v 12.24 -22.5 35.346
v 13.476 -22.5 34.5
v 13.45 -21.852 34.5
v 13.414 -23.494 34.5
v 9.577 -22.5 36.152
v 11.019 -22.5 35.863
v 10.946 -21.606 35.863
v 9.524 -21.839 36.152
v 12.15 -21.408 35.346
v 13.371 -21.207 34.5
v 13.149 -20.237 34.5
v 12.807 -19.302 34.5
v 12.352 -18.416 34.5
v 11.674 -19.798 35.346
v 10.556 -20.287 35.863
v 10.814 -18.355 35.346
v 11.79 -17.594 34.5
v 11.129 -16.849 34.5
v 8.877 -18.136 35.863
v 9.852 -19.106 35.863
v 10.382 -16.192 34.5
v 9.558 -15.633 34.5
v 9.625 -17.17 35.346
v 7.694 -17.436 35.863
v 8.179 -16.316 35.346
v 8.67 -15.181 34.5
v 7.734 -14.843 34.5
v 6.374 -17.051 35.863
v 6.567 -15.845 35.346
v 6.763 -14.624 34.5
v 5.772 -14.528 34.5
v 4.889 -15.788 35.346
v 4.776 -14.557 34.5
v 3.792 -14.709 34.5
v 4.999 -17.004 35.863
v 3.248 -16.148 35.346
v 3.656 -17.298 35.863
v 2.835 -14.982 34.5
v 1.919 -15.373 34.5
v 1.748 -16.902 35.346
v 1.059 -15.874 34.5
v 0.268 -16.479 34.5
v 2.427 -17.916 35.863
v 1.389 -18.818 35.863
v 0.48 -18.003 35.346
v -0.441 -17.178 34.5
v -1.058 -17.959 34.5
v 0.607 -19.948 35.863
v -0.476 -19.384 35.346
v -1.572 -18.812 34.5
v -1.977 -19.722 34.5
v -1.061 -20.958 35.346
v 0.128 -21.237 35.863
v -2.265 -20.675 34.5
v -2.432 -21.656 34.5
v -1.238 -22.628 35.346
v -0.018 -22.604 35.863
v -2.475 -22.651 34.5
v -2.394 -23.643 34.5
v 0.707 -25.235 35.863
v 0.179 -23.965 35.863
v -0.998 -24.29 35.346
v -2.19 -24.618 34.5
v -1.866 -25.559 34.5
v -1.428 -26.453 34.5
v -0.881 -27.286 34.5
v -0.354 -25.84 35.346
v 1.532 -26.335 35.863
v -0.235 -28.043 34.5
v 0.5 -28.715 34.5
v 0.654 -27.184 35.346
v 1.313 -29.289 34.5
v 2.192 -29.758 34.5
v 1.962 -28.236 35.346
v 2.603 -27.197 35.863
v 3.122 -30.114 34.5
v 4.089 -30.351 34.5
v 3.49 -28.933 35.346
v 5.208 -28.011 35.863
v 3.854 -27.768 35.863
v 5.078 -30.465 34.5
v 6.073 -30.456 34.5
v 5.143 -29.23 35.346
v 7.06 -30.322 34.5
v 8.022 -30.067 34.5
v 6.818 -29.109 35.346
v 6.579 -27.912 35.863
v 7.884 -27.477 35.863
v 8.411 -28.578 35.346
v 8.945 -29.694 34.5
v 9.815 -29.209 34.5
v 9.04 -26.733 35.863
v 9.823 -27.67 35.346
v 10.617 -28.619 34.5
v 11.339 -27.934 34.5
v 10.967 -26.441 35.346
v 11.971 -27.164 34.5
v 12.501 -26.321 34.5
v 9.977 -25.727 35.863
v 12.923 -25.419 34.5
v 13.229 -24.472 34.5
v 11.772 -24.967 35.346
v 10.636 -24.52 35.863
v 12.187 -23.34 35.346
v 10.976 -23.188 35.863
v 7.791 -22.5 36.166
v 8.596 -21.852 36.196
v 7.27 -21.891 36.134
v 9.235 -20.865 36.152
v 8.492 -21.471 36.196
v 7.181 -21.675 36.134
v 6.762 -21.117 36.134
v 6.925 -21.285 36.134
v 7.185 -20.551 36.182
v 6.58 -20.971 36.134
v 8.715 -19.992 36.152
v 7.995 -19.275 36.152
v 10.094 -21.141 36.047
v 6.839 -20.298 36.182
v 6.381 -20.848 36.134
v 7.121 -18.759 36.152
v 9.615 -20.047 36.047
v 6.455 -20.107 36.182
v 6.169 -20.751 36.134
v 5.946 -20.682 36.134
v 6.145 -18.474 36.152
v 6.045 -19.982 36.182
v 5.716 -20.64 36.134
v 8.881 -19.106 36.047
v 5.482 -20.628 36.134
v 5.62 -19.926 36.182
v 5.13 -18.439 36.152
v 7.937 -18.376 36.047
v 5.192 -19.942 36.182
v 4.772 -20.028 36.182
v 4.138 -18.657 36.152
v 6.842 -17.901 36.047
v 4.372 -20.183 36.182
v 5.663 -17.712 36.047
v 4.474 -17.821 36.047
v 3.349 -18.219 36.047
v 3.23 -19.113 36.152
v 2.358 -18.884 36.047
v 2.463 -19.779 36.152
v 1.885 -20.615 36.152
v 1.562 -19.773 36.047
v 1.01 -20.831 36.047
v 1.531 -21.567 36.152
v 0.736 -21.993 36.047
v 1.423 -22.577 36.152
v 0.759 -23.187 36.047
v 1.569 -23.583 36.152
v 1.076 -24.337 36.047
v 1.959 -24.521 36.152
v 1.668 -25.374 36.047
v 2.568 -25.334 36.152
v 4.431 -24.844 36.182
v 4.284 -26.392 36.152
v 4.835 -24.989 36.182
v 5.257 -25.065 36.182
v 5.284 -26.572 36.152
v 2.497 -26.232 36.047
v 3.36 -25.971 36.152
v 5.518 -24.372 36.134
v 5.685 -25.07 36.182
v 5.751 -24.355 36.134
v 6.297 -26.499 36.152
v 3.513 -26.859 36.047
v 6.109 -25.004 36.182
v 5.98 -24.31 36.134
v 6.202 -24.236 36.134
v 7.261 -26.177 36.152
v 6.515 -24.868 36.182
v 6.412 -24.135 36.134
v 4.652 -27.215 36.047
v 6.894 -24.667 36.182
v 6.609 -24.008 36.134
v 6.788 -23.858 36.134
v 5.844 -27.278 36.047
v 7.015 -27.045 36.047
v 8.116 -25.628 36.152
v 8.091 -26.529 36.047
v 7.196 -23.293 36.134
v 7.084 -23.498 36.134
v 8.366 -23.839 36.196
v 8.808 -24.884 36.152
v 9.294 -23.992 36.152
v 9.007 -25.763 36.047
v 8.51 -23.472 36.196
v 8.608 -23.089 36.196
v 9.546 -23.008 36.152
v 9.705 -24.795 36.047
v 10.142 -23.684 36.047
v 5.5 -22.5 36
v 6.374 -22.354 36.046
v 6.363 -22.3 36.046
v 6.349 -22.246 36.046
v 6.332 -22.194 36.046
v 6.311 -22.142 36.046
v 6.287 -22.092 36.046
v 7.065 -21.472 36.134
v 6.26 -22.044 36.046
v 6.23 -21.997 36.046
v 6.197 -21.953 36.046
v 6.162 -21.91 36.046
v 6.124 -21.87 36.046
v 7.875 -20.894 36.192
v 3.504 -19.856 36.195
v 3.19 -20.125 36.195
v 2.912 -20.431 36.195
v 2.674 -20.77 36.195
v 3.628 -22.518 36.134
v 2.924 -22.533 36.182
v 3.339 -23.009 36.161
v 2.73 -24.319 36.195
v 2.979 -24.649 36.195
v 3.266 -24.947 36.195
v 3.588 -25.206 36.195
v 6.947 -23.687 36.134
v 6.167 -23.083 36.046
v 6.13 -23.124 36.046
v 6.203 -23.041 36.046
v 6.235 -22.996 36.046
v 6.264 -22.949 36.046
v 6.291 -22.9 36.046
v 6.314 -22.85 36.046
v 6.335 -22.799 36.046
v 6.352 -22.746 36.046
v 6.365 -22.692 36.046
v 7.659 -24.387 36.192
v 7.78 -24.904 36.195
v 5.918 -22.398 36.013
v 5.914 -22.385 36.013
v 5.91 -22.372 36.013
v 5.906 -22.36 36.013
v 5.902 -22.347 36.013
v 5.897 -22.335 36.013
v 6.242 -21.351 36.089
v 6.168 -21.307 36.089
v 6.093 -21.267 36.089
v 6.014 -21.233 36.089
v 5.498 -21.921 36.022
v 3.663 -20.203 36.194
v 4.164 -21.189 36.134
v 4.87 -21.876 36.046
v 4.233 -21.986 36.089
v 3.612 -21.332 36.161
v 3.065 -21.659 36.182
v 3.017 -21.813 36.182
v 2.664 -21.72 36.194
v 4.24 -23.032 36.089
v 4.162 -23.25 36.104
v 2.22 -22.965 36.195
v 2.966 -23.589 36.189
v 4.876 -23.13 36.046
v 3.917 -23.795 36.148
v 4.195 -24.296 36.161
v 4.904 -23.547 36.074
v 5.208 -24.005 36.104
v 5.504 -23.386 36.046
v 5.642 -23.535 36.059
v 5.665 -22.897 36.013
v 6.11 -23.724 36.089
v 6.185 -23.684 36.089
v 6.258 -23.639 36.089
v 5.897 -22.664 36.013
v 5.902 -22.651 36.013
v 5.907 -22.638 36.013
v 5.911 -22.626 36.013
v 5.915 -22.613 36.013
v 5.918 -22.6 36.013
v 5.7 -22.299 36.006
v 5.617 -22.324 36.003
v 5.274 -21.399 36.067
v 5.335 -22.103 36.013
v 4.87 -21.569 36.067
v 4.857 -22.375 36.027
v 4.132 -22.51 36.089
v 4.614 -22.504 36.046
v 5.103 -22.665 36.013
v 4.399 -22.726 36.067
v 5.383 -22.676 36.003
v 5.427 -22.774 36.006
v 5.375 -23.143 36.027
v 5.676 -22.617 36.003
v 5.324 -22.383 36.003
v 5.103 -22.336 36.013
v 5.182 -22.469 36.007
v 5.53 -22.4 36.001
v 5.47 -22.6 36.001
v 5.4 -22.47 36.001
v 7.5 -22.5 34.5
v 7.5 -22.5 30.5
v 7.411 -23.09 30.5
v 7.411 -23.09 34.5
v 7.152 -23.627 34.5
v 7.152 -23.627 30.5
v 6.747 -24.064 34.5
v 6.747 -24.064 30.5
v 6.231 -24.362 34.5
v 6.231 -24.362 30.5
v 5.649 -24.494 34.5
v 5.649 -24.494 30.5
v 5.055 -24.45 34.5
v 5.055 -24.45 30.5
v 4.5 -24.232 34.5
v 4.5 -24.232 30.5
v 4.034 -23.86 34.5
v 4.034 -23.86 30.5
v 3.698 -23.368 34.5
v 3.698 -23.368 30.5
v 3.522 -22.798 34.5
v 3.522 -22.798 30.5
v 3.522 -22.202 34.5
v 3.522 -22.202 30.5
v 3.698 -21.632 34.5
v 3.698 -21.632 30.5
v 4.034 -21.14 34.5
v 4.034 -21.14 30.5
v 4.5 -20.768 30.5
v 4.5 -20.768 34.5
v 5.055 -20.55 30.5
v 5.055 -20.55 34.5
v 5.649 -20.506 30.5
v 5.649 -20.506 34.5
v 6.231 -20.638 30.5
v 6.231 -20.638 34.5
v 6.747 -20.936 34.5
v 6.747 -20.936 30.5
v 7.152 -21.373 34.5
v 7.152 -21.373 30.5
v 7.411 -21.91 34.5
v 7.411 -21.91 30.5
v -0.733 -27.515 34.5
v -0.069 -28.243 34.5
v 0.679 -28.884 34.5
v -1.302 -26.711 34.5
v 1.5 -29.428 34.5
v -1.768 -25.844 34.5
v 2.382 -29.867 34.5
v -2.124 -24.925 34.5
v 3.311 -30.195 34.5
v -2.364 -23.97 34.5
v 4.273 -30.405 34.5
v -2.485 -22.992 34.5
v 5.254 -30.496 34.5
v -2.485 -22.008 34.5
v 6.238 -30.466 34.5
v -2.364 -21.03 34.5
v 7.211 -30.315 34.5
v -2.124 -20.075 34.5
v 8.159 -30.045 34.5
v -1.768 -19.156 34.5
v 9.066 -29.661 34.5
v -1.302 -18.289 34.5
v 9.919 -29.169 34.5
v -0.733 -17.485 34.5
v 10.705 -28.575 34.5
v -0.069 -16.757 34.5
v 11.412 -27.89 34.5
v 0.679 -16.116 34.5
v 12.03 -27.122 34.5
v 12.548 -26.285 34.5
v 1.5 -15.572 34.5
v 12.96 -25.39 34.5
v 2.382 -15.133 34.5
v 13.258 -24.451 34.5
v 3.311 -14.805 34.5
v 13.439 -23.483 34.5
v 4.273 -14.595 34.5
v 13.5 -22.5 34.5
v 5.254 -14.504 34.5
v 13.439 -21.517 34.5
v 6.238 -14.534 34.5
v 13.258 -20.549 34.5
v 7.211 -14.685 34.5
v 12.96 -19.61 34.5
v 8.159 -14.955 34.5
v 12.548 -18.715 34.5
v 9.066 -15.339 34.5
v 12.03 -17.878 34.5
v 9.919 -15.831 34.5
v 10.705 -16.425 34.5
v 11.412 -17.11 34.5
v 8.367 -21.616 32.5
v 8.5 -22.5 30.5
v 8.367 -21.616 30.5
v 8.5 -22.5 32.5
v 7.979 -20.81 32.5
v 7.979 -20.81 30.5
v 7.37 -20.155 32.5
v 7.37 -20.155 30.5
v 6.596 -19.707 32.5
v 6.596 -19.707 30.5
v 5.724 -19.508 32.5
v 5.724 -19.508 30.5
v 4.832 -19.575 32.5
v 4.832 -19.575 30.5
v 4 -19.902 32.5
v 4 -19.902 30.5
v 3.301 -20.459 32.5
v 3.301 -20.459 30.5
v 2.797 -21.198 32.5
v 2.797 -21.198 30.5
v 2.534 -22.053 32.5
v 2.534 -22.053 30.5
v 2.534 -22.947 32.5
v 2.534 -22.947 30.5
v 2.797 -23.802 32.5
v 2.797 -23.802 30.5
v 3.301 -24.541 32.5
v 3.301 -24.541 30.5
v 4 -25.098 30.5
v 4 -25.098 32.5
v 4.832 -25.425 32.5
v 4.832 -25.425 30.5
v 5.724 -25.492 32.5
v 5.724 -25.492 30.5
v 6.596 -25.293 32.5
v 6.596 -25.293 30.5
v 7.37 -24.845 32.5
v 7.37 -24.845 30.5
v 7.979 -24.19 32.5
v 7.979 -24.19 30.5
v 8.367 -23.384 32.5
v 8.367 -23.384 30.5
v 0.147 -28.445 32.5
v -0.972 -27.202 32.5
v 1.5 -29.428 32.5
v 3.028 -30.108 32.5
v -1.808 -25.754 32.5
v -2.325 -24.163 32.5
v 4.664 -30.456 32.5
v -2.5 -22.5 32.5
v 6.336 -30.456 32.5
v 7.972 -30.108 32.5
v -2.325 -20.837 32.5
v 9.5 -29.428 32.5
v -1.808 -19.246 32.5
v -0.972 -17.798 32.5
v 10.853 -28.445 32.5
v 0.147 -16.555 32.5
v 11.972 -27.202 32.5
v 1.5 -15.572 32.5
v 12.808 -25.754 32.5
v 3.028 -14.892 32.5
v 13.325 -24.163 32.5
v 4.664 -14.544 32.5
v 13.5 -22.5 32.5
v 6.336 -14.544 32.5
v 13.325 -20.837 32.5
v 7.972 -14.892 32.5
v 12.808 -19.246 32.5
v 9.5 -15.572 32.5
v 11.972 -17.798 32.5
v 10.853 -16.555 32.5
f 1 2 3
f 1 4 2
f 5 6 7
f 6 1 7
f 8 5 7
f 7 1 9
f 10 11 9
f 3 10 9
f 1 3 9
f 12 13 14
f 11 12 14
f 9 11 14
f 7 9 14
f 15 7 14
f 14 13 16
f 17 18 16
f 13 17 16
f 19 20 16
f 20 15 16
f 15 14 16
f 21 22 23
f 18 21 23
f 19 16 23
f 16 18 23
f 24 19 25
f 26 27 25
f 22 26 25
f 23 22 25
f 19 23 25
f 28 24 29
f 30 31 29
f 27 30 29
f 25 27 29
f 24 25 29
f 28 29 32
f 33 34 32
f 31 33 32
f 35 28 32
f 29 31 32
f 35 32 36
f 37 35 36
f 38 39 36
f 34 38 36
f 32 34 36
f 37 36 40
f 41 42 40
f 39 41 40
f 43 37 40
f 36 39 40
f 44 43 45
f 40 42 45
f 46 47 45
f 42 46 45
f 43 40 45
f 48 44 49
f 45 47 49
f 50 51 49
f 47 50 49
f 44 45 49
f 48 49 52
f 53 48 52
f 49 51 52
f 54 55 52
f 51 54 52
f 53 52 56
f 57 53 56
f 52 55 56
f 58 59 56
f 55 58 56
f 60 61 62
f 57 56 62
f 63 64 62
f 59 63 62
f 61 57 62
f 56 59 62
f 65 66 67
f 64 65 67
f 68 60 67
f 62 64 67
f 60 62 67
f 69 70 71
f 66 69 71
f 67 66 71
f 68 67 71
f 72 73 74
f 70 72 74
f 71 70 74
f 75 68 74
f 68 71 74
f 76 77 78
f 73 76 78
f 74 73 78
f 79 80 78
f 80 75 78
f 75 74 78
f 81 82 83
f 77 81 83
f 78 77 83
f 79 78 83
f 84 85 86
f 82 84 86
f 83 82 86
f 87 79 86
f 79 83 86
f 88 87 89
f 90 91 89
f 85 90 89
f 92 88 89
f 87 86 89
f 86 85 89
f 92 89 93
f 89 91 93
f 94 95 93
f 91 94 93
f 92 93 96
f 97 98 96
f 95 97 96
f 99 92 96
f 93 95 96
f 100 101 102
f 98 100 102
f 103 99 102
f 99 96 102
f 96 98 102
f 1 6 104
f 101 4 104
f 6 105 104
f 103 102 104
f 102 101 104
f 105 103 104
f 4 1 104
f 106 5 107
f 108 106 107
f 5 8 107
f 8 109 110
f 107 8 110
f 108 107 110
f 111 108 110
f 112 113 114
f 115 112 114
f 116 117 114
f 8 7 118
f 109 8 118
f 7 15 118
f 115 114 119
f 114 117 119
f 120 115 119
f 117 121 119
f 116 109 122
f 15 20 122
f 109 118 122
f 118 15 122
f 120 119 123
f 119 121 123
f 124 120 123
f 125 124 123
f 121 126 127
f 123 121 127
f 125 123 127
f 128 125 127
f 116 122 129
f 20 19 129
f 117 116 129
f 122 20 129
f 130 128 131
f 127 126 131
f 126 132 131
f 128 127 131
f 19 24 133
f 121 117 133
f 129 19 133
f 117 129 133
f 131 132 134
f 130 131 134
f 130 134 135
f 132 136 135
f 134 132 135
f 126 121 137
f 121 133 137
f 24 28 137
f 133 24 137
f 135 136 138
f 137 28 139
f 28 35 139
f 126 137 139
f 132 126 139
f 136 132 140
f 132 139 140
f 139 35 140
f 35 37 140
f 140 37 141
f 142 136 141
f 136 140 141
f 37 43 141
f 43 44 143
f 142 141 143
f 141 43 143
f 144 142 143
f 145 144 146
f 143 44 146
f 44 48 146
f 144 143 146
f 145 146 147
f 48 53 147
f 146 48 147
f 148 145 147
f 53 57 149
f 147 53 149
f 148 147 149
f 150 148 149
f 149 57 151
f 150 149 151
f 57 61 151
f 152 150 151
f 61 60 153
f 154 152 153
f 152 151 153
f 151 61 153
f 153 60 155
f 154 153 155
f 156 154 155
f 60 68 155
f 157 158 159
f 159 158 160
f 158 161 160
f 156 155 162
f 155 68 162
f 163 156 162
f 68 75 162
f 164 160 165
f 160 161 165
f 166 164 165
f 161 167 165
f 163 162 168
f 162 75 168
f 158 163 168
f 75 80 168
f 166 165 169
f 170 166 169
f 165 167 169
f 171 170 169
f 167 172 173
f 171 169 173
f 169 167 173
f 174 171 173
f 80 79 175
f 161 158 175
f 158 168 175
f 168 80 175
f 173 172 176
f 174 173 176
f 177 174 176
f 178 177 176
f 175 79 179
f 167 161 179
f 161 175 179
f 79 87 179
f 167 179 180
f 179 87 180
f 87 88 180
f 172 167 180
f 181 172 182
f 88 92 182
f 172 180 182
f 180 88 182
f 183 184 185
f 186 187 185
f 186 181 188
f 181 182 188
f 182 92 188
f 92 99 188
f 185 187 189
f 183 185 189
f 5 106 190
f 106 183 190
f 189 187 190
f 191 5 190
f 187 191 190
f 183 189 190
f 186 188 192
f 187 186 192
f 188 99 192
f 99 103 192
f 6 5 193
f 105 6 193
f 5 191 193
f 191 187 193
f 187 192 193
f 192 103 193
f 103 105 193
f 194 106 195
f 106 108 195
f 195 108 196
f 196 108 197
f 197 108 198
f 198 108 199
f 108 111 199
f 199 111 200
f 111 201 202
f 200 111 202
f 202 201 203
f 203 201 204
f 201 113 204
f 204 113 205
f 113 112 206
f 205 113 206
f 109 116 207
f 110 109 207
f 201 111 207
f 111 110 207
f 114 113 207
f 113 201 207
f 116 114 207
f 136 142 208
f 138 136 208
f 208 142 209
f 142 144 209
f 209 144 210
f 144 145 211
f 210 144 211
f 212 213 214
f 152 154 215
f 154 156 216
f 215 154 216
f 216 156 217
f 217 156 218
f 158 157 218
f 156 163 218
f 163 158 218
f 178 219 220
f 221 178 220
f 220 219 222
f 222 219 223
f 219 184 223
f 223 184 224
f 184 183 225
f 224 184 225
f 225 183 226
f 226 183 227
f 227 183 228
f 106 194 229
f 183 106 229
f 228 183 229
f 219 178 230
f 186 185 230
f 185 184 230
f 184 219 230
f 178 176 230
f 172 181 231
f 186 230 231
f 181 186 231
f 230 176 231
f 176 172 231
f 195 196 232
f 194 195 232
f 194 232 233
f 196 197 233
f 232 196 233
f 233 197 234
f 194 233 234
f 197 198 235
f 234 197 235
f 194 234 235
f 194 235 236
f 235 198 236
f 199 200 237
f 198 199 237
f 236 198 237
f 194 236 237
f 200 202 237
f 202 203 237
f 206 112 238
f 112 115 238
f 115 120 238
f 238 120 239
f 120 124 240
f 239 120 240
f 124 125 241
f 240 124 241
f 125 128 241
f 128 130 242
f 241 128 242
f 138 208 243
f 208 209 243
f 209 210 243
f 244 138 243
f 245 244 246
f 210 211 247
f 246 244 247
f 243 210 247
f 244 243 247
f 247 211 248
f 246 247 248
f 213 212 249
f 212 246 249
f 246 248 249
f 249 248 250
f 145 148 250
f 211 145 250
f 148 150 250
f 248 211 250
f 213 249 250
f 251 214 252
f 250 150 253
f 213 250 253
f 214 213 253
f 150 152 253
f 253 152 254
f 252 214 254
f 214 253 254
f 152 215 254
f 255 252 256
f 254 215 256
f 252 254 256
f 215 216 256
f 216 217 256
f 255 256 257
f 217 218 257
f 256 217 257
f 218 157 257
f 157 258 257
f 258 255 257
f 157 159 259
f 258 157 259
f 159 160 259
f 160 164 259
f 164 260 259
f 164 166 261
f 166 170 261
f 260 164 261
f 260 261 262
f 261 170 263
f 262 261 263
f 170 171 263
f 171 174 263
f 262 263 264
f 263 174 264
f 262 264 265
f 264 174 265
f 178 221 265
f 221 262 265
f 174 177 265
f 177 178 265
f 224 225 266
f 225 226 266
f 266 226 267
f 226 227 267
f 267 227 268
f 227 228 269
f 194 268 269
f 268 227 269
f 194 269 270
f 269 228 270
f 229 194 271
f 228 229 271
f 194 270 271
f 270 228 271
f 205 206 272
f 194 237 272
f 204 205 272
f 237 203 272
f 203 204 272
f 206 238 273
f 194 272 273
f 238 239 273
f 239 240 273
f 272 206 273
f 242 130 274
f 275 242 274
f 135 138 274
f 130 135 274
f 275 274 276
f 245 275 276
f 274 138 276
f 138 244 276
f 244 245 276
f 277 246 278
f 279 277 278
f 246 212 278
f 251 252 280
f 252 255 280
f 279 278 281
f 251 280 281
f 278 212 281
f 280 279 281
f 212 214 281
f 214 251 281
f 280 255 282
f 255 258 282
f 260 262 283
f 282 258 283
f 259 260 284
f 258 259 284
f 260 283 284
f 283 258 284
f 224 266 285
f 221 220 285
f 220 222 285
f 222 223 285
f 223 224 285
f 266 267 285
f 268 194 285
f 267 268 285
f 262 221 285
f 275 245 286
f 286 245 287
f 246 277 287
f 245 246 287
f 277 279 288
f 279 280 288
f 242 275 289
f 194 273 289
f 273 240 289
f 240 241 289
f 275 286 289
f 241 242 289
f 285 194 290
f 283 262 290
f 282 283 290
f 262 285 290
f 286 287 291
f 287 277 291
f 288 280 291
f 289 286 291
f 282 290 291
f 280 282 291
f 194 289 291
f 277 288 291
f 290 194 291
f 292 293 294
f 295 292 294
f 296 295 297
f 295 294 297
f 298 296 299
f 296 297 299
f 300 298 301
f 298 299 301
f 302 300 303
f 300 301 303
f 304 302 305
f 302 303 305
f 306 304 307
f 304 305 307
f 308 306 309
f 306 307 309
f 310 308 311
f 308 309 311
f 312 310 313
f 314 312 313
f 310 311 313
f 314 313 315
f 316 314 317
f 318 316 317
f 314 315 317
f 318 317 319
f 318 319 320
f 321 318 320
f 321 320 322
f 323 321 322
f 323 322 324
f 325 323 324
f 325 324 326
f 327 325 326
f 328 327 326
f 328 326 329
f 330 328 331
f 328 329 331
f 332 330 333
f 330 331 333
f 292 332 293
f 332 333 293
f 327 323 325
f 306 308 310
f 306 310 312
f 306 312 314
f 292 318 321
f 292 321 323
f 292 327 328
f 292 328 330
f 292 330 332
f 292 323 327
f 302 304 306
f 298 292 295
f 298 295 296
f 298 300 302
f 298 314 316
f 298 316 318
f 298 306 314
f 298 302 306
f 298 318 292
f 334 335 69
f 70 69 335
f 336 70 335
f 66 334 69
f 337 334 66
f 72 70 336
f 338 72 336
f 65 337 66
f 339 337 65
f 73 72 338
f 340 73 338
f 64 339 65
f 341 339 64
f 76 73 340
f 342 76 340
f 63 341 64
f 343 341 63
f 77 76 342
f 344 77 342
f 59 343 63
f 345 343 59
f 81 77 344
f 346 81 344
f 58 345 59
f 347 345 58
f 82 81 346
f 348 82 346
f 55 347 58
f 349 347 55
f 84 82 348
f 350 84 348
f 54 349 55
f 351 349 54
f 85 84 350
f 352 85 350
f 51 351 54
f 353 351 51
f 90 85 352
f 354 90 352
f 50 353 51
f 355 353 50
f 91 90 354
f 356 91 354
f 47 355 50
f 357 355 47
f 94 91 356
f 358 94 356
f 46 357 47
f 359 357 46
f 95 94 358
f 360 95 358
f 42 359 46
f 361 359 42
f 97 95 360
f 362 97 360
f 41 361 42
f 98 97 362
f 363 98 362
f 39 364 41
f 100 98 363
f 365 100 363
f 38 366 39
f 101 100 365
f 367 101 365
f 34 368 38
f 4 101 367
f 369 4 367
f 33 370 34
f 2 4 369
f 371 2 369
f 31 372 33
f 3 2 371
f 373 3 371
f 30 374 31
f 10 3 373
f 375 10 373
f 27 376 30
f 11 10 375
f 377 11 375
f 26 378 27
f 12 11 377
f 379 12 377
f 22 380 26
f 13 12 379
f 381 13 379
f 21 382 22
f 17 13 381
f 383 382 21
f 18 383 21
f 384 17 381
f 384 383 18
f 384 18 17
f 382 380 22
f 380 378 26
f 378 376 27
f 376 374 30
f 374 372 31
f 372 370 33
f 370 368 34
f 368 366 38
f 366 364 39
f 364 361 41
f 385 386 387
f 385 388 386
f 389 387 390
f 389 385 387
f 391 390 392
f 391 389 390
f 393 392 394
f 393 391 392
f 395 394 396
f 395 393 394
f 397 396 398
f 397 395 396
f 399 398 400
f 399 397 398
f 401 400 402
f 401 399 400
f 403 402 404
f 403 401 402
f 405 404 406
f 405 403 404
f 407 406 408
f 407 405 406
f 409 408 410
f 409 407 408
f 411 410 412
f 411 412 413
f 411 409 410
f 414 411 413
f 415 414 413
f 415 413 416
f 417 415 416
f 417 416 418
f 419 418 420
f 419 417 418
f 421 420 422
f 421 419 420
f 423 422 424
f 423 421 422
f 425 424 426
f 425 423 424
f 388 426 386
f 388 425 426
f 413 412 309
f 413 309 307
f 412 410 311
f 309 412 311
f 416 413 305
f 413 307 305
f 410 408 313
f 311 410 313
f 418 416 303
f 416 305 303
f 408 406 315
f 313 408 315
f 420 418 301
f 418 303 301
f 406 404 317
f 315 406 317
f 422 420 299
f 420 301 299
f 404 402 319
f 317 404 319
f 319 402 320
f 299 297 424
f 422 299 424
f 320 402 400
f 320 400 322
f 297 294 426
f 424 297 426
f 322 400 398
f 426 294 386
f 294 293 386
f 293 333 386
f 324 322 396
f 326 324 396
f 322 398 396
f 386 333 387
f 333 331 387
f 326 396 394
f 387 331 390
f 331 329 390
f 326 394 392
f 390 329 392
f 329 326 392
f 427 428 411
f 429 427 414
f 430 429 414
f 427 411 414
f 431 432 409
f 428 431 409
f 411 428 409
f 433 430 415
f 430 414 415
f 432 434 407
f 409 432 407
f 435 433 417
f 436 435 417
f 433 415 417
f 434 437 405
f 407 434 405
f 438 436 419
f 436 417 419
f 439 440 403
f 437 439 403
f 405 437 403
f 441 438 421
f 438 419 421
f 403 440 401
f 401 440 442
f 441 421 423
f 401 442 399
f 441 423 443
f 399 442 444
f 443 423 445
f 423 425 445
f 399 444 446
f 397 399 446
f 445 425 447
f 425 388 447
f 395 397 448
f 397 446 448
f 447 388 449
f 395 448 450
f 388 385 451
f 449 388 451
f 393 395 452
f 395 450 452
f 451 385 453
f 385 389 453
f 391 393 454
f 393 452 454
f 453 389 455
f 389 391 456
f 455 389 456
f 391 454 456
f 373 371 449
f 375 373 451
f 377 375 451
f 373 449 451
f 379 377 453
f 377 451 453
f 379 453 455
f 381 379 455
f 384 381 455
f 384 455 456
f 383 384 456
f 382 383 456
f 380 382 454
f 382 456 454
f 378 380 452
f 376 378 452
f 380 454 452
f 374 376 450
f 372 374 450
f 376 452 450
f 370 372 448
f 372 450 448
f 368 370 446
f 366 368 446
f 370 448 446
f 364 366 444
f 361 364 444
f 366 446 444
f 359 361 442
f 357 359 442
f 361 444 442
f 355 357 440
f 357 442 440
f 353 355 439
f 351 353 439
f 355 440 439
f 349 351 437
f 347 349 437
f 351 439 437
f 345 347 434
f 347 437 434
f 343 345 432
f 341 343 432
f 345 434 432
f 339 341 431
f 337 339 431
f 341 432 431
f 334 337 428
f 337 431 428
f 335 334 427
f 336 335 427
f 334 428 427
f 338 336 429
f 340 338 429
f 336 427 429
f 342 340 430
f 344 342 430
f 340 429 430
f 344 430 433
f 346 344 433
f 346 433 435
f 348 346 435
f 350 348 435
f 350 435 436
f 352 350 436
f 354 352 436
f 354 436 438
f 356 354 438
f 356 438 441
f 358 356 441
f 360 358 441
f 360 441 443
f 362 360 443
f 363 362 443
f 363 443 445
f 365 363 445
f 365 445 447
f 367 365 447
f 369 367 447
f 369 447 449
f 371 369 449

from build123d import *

# Parameters (mm, degrees)
SKETCH069_R     = 3
PAD040_DEPTH    = 0.5
SKETCH070_R     = 3
PAD041_DEPTH    = 1.5
SKETCH072_R     = 8
PAD049_DEPTH    = 2
SKETCH071_R     = 2
POCKET046_DEPTH = 4


with BuildPart() as part:
    # Sketch069 → Pad040 (new body)
    with BuildSketch(Plane.XY.offset(32)):
        with Locations((5.5, -22.5)):
            Circle(SKETCH069_R)
    extrude(amount=PAD040_DEPTH)

    # Sketch070 → Pad041 (join)
    with BuildSketch(Plane.XY.offset(32)):
        with Locations((5.5, -22.5)):
            Circle(SKETCH070_R)
    extrude(amount=-PAD041_DEPTH)

    # Sketch072 → Pad049 (join)
    with BuildSketch(Plane.XY.offset(32.5)):
        with Locations((5.5, -22.5)):
            Circle(SKETCH072_R)
    extrude(amount=PAD049_DEPTH)

    # Sketch094 → Revolution (revolve)
    with BuildSketch(Plane(origin=(5.5, -22.5, 18), x_dir=(1, 0, 0), z_dir=(0, -1, 0))):
        with BuildLine():
            Line((0, 18), (0, 16.48024))
            Line((0, 16.48024), (8, 16.48024))
            add(Edge.make_bspline(
                [(0, 18), (2, 18), (5, 19), (8, 16.48024)],
                knots=[0, 0, 0, 0, 1, 1, 1, 1], degree=3))
        make_face()
    revolve(axis=Axis((5.5, -22.5, 18), (0, 0, 1)))

    # Sketch071 (on Face4 of Pad041) → Pocket046 (cut)
    with BuildSketch(Plane(origin=(0, 0, 30.5), x_dir=(1, 0, 0), z_dir=(0, 0, -1))):
        with Locations((5.5, 22.5)):
            Circle(SKETCH071_R)
    extrude(amount=-POCKET046_DEPTH, mode=Mode.SUBTRACT)


solid = part.part
